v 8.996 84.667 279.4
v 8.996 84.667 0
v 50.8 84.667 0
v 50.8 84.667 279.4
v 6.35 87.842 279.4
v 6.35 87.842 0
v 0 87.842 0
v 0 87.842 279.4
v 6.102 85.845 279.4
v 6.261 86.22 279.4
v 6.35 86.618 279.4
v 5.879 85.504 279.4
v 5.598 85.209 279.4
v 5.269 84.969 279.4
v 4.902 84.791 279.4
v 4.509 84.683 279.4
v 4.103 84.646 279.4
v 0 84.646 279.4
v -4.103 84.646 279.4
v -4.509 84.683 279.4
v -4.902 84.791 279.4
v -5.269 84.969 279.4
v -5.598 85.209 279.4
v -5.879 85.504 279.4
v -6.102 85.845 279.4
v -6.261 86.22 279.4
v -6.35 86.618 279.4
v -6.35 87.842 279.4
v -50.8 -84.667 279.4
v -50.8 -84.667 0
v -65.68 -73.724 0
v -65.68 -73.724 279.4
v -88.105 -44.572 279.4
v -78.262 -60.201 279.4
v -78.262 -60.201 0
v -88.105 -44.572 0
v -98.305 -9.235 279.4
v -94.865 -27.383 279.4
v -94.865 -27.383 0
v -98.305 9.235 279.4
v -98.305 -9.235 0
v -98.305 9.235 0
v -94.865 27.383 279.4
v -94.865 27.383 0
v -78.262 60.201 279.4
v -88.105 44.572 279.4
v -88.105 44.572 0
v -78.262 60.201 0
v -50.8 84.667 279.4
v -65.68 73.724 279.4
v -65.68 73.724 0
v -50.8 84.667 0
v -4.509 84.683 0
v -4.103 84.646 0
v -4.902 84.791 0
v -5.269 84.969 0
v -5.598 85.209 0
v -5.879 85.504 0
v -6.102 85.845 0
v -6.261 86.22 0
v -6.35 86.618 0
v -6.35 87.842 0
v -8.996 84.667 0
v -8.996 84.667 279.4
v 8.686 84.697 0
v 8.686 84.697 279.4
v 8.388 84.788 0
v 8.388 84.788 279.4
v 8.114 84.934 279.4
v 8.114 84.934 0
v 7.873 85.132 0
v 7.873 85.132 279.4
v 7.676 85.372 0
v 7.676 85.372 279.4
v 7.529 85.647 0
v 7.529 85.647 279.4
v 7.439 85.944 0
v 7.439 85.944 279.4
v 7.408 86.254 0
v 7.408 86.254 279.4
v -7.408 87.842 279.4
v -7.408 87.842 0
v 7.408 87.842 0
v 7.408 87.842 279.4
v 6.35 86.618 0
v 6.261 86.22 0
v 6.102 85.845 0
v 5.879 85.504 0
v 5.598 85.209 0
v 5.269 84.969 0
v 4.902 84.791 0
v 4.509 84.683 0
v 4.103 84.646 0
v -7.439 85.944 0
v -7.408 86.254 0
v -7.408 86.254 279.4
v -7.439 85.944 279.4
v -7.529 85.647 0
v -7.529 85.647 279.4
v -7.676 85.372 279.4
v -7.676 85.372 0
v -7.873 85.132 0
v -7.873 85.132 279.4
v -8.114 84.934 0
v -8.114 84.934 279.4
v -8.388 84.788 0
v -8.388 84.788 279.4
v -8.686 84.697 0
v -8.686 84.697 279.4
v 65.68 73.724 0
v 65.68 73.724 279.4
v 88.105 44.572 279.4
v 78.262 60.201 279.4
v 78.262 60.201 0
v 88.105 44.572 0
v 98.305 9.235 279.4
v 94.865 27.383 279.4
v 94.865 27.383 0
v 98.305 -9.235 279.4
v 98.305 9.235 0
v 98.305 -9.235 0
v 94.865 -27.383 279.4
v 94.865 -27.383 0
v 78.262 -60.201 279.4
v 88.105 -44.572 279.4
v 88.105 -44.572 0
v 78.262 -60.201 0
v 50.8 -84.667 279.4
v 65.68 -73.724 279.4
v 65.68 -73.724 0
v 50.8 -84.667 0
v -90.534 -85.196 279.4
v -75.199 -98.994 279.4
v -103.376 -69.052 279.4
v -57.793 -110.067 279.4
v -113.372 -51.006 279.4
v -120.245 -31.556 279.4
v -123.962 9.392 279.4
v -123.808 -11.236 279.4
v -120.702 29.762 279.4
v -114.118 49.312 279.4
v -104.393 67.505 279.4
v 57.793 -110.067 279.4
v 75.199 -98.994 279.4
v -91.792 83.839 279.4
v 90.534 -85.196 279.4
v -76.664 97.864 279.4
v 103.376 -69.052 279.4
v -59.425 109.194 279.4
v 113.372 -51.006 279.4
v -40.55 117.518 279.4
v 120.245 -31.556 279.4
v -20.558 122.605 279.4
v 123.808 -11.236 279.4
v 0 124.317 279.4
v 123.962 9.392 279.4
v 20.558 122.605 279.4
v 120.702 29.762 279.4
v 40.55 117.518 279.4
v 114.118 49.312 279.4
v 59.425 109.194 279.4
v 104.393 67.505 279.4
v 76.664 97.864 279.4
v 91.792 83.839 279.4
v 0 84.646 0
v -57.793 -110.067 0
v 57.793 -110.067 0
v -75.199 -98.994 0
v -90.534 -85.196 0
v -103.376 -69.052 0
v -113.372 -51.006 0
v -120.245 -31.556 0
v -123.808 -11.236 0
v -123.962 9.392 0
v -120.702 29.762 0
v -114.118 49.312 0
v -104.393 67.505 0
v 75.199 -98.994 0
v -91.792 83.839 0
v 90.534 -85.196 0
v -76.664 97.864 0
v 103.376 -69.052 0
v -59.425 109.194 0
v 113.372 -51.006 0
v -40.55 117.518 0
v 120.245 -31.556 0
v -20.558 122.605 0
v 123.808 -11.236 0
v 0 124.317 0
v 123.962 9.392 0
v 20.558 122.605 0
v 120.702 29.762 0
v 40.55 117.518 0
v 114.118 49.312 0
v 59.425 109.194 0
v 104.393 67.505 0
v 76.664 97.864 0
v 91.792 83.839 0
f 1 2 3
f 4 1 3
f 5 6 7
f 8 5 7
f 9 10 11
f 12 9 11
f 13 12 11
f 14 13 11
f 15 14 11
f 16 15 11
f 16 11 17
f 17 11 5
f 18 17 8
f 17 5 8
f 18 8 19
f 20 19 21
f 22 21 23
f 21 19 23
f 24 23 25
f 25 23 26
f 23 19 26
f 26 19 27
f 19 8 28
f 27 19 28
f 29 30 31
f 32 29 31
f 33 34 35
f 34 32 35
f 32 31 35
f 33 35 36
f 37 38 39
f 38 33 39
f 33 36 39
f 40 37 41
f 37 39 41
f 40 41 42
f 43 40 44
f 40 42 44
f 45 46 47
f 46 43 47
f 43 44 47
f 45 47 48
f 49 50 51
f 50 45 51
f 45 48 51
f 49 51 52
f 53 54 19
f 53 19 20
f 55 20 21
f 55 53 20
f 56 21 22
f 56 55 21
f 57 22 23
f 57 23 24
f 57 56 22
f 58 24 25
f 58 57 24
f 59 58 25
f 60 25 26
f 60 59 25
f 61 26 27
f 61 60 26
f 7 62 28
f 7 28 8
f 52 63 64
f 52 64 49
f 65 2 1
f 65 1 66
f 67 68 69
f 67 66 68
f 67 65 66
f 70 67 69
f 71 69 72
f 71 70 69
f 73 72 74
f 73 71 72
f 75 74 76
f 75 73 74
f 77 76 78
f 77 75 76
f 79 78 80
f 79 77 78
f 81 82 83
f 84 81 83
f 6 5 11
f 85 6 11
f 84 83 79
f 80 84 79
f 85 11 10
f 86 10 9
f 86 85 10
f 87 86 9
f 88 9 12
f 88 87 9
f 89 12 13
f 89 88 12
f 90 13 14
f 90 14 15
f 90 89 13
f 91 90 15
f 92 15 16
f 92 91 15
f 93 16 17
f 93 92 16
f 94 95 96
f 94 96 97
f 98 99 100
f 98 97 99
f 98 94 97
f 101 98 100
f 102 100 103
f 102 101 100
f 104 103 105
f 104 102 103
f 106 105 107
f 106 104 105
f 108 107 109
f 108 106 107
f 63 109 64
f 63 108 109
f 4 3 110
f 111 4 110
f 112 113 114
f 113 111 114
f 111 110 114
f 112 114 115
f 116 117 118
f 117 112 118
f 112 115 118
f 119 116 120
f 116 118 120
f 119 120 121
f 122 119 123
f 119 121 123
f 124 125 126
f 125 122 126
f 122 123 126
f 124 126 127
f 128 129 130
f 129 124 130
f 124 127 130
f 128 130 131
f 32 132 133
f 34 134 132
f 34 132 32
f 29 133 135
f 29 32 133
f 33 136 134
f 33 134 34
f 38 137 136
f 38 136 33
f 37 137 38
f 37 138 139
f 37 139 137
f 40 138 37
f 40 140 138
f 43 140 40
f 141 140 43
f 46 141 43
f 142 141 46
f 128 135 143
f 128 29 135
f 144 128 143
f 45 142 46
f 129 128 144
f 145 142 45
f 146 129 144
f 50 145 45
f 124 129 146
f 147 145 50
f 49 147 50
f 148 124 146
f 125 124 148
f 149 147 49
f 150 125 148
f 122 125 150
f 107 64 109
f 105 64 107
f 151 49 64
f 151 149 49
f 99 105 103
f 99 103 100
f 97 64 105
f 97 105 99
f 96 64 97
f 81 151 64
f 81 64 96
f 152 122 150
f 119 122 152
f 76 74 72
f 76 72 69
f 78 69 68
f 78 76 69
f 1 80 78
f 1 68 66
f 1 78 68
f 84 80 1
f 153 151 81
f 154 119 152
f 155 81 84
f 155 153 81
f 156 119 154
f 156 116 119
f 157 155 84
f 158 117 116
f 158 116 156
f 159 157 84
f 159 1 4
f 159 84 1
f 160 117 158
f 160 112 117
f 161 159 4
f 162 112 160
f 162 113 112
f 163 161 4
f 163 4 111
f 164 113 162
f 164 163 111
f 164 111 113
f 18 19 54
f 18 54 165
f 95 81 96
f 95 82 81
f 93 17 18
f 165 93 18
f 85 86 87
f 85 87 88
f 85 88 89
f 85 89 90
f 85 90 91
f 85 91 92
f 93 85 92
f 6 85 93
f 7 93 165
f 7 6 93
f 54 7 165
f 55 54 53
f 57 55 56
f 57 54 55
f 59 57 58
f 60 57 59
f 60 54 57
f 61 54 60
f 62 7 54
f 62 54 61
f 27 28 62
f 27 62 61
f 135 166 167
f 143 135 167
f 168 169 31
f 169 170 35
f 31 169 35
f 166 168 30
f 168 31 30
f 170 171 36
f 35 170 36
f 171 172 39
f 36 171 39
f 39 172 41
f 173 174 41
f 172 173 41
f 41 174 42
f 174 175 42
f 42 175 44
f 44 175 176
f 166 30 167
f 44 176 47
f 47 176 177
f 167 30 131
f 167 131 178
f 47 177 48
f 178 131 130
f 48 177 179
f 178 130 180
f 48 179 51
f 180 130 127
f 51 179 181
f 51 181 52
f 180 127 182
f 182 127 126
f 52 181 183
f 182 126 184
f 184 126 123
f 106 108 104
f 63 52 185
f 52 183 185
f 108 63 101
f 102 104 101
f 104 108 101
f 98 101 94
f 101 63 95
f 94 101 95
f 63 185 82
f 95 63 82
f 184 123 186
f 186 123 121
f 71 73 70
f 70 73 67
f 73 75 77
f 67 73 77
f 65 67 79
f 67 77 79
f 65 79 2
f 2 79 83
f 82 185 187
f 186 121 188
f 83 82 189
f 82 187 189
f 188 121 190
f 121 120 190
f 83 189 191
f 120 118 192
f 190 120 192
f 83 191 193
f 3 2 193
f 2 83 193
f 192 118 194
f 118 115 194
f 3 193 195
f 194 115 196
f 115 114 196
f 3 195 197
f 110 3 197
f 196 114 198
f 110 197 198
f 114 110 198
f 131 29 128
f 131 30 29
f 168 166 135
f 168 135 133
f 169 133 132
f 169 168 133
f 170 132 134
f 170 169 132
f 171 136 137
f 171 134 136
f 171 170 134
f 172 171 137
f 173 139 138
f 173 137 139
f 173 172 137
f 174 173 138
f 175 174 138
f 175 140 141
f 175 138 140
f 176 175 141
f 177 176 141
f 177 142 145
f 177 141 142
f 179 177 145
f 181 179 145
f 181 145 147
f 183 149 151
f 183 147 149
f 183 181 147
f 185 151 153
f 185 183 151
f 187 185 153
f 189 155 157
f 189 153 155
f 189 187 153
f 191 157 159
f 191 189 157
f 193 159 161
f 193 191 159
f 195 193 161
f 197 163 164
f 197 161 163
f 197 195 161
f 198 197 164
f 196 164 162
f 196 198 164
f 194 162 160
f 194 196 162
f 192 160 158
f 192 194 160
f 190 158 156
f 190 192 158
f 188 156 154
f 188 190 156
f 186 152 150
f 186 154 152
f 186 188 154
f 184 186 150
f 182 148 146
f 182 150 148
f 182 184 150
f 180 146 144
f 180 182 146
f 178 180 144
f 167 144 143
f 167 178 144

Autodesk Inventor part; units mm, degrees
ref_plane "YZ Plane" through (0, 0, 0) normal (1, 0, 0) x (0, 1, 0)
ref_plane "XZ Plane" through (0, 0, 0) normal (0, 1, 0) x (-1, 0, 0)
ref_plane "XY Plane" through (0, 0, 0) normal (0, 0, 1) x (1, 0, 0)
sketch "Sketch1" plane through (0, 0, 0) normal (0, 0, 1) x (1, 0, 0)
  line L0 (-50.8, -84.6667) -> (50.8, -84.6667)
  arc A0 (57.793, -110.0667) -> (-57.793, -110.0667) centre (0, 0) ccw
  arc A1 (-50.8, 84.6667) -> (-50.8, -84.6667) centre (0, 0) ccw
  arc A2 (50.8, -84.6667) -> (50.8, 84.6667) centre (0, 0) ccw
  line L1 (-57.793, -110.0667) -> (57.793, -110.0667)
  line L2 (0, 84.6667) -> (0, 87.8417) construction
  line L3 (-7.4083, 87.8417) -> (7.4083, 87.8417)
  line L4 (-7.4083, 87.8417) -> (-7.4083, 86.2542)
  line L5 (7.4083, 87.8417) -> (7.4083, 86.2542)
  line L6 (8.9958, 84.6667) -> (50.8, 84.6667)
  line L7 (-8.9958, 84.6667) -> (8.9958, 84.6667) construction
  arc A3 (7.4083, 86.2542) -> (8.9958, 84.6667) centre (8.9958, 86.2542) ccw
  arc A4 (-8.9958, 84.6667) -> (-7.4083, 86.2542) centre (-8.9958, 86.2542) ccw
  line L8 (-8.9958, 84.6667) -> (-50.8, 84.6667)
  dimension "d1" = 101.6
  dimension "d20" = 25.4
  dimension "d21" = 124.3169
  dimension "d23" = 14.8167
  dimension "d27" = 98.7374
  dimension "d28" = 98.7374
  dimension "d30" = 43.3917
  dimension "d39" = 1.5875
  dimension "d40" = 1.5875
  dimension "d41" = 41.8042
  dimension "d44" = 3.175
extrude "corridor" add sketch "Sketch1" along normal blind 279.4
sketch "Sketch5" plane through (0, 0, 0) normal (0, 0, -1) x (-1, 0, 0)
  line L0 (-6.35, 87.8417) -> (0, 87.8417)
  line L1 (7.4083, 87.8417) -> (-7.4083, 87.8417) projected
  line L2 (-6.35, 87.8417) -> (-6.35, 86.6178)
  line L3 (-4.1034, 84.646) -> (0, 84.646)
  line L4 (0, 84.646) -> (0, 87.8417) construction
  line L5 (-6.3485, 84.6667) -> (-3.1743, 87.8409) construction
  arc A0 (-3.1736, 84.646) -> (-6.35, 87.8417) centre (-6.3485, 84.6667) ccw construction
  arc A1 (-6.35, 86.6178) -> (-4.1034, 84.646) centre (-4.1034, 86.9117) ccw
  line L6 (6.35, 87.8417) -> (0, 87.8417)
  line L7 (6.35, 87.8417) -> (6.35, 86.6178)
  line L8 (4.1034, 84.646) -> (0, 84.646)
  line L9 (6.3485, 84.6667) -> (3.1743, 87.8409) construction
  arc A2 (6.35, 87.8417) -> (3.1736, 84.646) centre (6.3485, 84.6667) ccw construction
  arc A3 (4.1034, 84.646) -> (6.35, 86.6178) centre (4.1034, 86.9117) ccw
  point P0 (0, 0)
  dimension "d31" = 6.35
  dimension "d32" = 3.175
  dimension "d34" = 45
  dimension "d35" = 2.2657
  dimension "d36" = 2.2466
  dimension "d45" = 1.2238
extrude "light" add sketch "Sketch5" against normal up to surface (279.4 mm away) separate body
equation "\"d28\" = d27"
equation "\"d39\" = 0.5 * d26"
equation "\"d26\" = 3.175"
properties part number "corridor"
